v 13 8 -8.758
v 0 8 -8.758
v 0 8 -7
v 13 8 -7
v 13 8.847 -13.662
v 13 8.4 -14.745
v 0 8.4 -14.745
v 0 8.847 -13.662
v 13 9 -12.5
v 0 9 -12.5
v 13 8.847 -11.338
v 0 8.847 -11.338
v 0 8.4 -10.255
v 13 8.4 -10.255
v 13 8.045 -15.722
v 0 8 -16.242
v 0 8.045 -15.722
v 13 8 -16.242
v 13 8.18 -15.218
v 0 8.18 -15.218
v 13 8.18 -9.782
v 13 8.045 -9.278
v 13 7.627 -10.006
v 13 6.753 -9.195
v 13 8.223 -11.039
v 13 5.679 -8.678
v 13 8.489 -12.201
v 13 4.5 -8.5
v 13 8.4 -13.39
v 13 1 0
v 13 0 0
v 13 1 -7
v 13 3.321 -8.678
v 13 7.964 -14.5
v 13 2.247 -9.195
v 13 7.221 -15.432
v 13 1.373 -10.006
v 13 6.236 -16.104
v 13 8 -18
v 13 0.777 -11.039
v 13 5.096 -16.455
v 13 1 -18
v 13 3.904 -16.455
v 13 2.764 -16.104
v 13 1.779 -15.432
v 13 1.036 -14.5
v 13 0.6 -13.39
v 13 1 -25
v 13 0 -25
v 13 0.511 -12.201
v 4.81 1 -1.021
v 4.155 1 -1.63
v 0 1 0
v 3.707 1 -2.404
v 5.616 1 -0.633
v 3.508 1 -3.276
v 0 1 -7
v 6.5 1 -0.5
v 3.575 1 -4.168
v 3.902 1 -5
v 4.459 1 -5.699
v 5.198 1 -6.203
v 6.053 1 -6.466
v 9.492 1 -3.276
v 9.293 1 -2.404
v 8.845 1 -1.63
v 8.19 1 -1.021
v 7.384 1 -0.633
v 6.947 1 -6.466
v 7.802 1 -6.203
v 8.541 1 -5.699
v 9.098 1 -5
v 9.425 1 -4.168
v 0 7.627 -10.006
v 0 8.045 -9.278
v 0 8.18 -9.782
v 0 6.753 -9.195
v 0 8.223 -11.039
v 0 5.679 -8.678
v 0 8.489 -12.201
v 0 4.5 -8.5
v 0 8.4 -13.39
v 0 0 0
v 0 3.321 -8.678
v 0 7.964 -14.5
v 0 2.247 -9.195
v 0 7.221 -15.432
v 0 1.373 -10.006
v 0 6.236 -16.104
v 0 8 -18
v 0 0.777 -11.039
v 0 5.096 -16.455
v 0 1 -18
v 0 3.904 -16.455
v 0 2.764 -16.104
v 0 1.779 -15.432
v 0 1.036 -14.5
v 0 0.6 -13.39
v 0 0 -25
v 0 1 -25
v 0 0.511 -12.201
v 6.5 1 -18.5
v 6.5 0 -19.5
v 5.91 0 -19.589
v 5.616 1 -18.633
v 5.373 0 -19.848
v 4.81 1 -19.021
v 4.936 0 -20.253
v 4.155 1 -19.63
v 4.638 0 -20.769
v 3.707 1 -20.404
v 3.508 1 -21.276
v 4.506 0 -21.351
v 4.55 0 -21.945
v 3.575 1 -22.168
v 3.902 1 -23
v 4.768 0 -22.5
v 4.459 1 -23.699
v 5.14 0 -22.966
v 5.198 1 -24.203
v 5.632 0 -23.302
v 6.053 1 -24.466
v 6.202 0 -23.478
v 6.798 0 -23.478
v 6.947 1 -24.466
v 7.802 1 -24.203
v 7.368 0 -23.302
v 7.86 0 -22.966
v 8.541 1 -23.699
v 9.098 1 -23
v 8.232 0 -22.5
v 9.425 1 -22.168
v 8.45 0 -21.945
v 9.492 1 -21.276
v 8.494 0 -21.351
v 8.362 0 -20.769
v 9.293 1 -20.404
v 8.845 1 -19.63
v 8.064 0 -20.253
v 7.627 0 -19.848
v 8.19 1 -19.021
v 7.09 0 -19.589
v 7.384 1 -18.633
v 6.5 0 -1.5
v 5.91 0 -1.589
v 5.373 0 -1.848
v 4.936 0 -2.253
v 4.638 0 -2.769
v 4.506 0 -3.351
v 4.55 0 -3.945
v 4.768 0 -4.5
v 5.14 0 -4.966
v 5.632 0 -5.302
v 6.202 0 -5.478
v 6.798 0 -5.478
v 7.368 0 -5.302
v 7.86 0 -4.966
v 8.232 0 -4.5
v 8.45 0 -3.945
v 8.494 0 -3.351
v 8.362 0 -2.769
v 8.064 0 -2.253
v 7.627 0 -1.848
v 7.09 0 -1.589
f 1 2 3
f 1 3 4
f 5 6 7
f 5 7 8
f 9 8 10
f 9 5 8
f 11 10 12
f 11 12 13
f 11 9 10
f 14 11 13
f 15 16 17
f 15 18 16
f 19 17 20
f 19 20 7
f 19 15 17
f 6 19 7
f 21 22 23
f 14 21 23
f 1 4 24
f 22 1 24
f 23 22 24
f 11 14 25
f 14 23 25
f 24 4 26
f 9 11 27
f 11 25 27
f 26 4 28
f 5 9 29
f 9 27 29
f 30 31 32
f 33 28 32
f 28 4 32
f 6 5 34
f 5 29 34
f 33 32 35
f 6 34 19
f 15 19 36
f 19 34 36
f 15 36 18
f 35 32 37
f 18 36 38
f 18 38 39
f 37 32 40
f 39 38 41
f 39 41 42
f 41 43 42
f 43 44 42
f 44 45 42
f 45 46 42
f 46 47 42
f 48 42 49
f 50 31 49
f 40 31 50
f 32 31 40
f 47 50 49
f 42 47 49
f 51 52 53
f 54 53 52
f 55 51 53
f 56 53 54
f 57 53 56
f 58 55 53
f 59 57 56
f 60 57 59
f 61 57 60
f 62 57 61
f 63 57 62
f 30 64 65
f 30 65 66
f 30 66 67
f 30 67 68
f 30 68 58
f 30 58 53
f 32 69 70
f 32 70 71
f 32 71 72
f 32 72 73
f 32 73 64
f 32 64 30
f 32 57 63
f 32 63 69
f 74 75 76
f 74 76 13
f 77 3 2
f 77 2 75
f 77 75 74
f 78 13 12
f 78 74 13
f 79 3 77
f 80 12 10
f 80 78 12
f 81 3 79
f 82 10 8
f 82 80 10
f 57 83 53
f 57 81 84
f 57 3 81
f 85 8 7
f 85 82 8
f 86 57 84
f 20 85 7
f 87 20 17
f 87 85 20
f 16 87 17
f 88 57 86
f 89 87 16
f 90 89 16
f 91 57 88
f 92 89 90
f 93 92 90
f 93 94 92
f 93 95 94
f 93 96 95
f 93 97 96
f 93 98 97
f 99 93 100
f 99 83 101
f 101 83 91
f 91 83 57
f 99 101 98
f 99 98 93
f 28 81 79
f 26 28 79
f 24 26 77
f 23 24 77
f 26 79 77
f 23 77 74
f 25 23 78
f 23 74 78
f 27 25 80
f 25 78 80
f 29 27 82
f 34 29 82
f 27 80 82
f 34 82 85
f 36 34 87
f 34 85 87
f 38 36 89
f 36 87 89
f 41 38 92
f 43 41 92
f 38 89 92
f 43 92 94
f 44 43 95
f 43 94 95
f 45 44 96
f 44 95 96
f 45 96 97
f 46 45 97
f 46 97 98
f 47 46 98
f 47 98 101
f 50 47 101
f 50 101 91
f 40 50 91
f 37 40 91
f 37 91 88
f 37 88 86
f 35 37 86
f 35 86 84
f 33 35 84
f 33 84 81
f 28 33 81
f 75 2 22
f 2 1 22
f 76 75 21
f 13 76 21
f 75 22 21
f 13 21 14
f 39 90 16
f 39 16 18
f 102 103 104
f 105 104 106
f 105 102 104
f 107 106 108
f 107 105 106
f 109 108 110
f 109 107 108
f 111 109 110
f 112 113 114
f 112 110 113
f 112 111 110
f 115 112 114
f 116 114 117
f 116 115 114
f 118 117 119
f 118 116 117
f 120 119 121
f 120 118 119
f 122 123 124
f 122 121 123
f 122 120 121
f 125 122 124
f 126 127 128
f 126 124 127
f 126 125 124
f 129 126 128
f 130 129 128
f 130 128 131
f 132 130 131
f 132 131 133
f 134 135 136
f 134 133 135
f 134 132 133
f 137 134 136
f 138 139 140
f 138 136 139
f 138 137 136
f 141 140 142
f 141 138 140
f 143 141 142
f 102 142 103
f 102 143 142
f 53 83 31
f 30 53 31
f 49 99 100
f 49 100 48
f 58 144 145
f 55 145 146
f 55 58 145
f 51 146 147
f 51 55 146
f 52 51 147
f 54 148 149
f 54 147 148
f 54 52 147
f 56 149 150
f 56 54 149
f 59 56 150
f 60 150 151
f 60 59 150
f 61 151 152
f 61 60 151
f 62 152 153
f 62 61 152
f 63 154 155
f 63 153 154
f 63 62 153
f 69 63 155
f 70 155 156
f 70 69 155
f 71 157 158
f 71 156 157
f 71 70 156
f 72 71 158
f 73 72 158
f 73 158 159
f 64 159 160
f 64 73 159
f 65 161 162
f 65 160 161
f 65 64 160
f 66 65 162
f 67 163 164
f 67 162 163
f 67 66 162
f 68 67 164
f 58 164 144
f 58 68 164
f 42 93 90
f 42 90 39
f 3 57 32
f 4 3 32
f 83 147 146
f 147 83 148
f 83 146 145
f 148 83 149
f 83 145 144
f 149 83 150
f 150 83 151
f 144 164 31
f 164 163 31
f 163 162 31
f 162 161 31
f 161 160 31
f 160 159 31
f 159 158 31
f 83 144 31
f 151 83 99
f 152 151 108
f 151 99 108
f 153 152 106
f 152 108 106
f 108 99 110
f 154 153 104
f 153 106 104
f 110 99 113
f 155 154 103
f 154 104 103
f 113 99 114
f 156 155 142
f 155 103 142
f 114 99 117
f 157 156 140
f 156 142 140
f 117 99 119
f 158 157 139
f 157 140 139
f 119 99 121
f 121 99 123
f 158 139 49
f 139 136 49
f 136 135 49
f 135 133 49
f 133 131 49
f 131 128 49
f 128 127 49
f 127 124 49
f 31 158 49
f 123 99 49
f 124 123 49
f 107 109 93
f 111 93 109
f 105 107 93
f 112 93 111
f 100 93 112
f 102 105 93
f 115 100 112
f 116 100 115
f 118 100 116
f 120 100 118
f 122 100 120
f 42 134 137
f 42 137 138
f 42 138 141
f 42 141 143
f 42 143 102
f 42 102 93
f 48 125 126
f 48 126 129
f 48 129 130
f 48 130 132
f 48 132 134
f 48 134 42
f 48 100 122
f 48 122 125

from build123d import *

# Parameters (mm, degrees)
SKETCH1_W                                      = 13
SKETCH1_H                                      = 25
BOSS_EXTRUDE1_DEPTH                            = 1
SKETCH3_W                                      = 13
SKETCH3_H                                      = 11
BOSS_EXTRUDE2_DEPTH                            = 7
SKETCH4_R                                      = 4.5
BOSS_EXTRUDE3_DEPTH                            = 13
SKETCH6_R                                      = 4
CUT_EXTRUDE1_DEPTH                             = 30.58042089
FILLET1_R                                      = 3
CSK_FOR_M3_OVAL_HEAD_MACHINE_SCREW2_AT_2_COUNT = 2
CSK_FOR_M3_OVAL_HEAD_MACHINE_SCREW2_AT_2_PITCH = 18


with BuildPart() as part:
    # Sketch1 → Boss-Extrude1 (new body)
    with BuildSketch(Plane(origin=(0, 0, 0), x_dir=(1, 0, 0), z_dir=(0, 1, 0))):
        with Locations((6.5, 12.5)):
            Rectangle(SKETCH1_W, SKETCH1_H)
    extrude(amount=BOSS_EXTRUDE1_DEPTH)

    # Sketch3 → Boss-Extrude2 (add)
    with BuildSketch(Plane(origin=(0, 1, 0), x_dir=(1, 0, 0), z_dir=(0, 1, 0))):
        with Locations((6.5, 12.5)):
            Rectangle(SKETCH3_W, SKETCH3_H)
    extrude(amount=BOSS_EXTRUDE2_DEPTH)

    # Sketch4 → Boss-Extrude3 (add, through all)
    with BuildSketch(Plane(origin=(13, 0, 0), x_dir=(0, 0, -1), z_dir=(1, 0, 0))):
        with Locations((12.5, 4.5)):
            Circle(SKETCH4_R)
    extrude(amount=-BOSS_EXTRUDE3_DEPTH)

    # Sketch6 → Cut-Extrude1 (cut, through all)
    with BuildSketch(Plane.ZY.offset(5e-05)):
        with Locations((-12.5, 4.5)):
            Circle(SKETCH6_R)
    extrude(amount=-CUT_EXTRUDE1_DEPTH, mode=Mode.SUBTRACT)

    # Fillet1
    fillet1_edges = [part.edges().sort_by_distance(p)[0] for p in [
        (6.5, 8, -15.328427125),
        (6.5, 8, -9.671572875),
    ]]
    fillet(fillet1_edges, radius=FILLET1_R)

    # Sketch15 → CSK for M3 Oval Head Machine Screw2 (revolve, cut)
    with BuildSketch(Plane(origin=(6.5, 1, -3.5), x_dir=(0, 0, 1), z_dir=(1, 0, 0))):
        Polygon((0, 0), (0, 1), (1.75, 1), (1.75, 1.25), (3, 0), align=None)
    csk_for_m3_oval_head_machine_screw2 = revolve(axis=Axis((6.5, 7.35, -3.5), (0, -1, 0)), mode=Mode.SUBTRACT)

    # CSK for M3 Oval Head Machine Screw2 at 2: CSK for M3 Oval Head Machine Screw2 ×2
    with Locations(*[(0, 0, -i * CSK_FOR_M3_OVAL_HEAD_MACHINE_SCREW2_AT_2_PITCH) for i in range(1, CSK_FOR_M3_OVAL_HEAD_MACHINE_SCREW2_AT_2_COUNT)]):
        add(csk_for_m3_oval_head_machine_screw2, mode=Mode.SUBTRACT)


solid = part.part
